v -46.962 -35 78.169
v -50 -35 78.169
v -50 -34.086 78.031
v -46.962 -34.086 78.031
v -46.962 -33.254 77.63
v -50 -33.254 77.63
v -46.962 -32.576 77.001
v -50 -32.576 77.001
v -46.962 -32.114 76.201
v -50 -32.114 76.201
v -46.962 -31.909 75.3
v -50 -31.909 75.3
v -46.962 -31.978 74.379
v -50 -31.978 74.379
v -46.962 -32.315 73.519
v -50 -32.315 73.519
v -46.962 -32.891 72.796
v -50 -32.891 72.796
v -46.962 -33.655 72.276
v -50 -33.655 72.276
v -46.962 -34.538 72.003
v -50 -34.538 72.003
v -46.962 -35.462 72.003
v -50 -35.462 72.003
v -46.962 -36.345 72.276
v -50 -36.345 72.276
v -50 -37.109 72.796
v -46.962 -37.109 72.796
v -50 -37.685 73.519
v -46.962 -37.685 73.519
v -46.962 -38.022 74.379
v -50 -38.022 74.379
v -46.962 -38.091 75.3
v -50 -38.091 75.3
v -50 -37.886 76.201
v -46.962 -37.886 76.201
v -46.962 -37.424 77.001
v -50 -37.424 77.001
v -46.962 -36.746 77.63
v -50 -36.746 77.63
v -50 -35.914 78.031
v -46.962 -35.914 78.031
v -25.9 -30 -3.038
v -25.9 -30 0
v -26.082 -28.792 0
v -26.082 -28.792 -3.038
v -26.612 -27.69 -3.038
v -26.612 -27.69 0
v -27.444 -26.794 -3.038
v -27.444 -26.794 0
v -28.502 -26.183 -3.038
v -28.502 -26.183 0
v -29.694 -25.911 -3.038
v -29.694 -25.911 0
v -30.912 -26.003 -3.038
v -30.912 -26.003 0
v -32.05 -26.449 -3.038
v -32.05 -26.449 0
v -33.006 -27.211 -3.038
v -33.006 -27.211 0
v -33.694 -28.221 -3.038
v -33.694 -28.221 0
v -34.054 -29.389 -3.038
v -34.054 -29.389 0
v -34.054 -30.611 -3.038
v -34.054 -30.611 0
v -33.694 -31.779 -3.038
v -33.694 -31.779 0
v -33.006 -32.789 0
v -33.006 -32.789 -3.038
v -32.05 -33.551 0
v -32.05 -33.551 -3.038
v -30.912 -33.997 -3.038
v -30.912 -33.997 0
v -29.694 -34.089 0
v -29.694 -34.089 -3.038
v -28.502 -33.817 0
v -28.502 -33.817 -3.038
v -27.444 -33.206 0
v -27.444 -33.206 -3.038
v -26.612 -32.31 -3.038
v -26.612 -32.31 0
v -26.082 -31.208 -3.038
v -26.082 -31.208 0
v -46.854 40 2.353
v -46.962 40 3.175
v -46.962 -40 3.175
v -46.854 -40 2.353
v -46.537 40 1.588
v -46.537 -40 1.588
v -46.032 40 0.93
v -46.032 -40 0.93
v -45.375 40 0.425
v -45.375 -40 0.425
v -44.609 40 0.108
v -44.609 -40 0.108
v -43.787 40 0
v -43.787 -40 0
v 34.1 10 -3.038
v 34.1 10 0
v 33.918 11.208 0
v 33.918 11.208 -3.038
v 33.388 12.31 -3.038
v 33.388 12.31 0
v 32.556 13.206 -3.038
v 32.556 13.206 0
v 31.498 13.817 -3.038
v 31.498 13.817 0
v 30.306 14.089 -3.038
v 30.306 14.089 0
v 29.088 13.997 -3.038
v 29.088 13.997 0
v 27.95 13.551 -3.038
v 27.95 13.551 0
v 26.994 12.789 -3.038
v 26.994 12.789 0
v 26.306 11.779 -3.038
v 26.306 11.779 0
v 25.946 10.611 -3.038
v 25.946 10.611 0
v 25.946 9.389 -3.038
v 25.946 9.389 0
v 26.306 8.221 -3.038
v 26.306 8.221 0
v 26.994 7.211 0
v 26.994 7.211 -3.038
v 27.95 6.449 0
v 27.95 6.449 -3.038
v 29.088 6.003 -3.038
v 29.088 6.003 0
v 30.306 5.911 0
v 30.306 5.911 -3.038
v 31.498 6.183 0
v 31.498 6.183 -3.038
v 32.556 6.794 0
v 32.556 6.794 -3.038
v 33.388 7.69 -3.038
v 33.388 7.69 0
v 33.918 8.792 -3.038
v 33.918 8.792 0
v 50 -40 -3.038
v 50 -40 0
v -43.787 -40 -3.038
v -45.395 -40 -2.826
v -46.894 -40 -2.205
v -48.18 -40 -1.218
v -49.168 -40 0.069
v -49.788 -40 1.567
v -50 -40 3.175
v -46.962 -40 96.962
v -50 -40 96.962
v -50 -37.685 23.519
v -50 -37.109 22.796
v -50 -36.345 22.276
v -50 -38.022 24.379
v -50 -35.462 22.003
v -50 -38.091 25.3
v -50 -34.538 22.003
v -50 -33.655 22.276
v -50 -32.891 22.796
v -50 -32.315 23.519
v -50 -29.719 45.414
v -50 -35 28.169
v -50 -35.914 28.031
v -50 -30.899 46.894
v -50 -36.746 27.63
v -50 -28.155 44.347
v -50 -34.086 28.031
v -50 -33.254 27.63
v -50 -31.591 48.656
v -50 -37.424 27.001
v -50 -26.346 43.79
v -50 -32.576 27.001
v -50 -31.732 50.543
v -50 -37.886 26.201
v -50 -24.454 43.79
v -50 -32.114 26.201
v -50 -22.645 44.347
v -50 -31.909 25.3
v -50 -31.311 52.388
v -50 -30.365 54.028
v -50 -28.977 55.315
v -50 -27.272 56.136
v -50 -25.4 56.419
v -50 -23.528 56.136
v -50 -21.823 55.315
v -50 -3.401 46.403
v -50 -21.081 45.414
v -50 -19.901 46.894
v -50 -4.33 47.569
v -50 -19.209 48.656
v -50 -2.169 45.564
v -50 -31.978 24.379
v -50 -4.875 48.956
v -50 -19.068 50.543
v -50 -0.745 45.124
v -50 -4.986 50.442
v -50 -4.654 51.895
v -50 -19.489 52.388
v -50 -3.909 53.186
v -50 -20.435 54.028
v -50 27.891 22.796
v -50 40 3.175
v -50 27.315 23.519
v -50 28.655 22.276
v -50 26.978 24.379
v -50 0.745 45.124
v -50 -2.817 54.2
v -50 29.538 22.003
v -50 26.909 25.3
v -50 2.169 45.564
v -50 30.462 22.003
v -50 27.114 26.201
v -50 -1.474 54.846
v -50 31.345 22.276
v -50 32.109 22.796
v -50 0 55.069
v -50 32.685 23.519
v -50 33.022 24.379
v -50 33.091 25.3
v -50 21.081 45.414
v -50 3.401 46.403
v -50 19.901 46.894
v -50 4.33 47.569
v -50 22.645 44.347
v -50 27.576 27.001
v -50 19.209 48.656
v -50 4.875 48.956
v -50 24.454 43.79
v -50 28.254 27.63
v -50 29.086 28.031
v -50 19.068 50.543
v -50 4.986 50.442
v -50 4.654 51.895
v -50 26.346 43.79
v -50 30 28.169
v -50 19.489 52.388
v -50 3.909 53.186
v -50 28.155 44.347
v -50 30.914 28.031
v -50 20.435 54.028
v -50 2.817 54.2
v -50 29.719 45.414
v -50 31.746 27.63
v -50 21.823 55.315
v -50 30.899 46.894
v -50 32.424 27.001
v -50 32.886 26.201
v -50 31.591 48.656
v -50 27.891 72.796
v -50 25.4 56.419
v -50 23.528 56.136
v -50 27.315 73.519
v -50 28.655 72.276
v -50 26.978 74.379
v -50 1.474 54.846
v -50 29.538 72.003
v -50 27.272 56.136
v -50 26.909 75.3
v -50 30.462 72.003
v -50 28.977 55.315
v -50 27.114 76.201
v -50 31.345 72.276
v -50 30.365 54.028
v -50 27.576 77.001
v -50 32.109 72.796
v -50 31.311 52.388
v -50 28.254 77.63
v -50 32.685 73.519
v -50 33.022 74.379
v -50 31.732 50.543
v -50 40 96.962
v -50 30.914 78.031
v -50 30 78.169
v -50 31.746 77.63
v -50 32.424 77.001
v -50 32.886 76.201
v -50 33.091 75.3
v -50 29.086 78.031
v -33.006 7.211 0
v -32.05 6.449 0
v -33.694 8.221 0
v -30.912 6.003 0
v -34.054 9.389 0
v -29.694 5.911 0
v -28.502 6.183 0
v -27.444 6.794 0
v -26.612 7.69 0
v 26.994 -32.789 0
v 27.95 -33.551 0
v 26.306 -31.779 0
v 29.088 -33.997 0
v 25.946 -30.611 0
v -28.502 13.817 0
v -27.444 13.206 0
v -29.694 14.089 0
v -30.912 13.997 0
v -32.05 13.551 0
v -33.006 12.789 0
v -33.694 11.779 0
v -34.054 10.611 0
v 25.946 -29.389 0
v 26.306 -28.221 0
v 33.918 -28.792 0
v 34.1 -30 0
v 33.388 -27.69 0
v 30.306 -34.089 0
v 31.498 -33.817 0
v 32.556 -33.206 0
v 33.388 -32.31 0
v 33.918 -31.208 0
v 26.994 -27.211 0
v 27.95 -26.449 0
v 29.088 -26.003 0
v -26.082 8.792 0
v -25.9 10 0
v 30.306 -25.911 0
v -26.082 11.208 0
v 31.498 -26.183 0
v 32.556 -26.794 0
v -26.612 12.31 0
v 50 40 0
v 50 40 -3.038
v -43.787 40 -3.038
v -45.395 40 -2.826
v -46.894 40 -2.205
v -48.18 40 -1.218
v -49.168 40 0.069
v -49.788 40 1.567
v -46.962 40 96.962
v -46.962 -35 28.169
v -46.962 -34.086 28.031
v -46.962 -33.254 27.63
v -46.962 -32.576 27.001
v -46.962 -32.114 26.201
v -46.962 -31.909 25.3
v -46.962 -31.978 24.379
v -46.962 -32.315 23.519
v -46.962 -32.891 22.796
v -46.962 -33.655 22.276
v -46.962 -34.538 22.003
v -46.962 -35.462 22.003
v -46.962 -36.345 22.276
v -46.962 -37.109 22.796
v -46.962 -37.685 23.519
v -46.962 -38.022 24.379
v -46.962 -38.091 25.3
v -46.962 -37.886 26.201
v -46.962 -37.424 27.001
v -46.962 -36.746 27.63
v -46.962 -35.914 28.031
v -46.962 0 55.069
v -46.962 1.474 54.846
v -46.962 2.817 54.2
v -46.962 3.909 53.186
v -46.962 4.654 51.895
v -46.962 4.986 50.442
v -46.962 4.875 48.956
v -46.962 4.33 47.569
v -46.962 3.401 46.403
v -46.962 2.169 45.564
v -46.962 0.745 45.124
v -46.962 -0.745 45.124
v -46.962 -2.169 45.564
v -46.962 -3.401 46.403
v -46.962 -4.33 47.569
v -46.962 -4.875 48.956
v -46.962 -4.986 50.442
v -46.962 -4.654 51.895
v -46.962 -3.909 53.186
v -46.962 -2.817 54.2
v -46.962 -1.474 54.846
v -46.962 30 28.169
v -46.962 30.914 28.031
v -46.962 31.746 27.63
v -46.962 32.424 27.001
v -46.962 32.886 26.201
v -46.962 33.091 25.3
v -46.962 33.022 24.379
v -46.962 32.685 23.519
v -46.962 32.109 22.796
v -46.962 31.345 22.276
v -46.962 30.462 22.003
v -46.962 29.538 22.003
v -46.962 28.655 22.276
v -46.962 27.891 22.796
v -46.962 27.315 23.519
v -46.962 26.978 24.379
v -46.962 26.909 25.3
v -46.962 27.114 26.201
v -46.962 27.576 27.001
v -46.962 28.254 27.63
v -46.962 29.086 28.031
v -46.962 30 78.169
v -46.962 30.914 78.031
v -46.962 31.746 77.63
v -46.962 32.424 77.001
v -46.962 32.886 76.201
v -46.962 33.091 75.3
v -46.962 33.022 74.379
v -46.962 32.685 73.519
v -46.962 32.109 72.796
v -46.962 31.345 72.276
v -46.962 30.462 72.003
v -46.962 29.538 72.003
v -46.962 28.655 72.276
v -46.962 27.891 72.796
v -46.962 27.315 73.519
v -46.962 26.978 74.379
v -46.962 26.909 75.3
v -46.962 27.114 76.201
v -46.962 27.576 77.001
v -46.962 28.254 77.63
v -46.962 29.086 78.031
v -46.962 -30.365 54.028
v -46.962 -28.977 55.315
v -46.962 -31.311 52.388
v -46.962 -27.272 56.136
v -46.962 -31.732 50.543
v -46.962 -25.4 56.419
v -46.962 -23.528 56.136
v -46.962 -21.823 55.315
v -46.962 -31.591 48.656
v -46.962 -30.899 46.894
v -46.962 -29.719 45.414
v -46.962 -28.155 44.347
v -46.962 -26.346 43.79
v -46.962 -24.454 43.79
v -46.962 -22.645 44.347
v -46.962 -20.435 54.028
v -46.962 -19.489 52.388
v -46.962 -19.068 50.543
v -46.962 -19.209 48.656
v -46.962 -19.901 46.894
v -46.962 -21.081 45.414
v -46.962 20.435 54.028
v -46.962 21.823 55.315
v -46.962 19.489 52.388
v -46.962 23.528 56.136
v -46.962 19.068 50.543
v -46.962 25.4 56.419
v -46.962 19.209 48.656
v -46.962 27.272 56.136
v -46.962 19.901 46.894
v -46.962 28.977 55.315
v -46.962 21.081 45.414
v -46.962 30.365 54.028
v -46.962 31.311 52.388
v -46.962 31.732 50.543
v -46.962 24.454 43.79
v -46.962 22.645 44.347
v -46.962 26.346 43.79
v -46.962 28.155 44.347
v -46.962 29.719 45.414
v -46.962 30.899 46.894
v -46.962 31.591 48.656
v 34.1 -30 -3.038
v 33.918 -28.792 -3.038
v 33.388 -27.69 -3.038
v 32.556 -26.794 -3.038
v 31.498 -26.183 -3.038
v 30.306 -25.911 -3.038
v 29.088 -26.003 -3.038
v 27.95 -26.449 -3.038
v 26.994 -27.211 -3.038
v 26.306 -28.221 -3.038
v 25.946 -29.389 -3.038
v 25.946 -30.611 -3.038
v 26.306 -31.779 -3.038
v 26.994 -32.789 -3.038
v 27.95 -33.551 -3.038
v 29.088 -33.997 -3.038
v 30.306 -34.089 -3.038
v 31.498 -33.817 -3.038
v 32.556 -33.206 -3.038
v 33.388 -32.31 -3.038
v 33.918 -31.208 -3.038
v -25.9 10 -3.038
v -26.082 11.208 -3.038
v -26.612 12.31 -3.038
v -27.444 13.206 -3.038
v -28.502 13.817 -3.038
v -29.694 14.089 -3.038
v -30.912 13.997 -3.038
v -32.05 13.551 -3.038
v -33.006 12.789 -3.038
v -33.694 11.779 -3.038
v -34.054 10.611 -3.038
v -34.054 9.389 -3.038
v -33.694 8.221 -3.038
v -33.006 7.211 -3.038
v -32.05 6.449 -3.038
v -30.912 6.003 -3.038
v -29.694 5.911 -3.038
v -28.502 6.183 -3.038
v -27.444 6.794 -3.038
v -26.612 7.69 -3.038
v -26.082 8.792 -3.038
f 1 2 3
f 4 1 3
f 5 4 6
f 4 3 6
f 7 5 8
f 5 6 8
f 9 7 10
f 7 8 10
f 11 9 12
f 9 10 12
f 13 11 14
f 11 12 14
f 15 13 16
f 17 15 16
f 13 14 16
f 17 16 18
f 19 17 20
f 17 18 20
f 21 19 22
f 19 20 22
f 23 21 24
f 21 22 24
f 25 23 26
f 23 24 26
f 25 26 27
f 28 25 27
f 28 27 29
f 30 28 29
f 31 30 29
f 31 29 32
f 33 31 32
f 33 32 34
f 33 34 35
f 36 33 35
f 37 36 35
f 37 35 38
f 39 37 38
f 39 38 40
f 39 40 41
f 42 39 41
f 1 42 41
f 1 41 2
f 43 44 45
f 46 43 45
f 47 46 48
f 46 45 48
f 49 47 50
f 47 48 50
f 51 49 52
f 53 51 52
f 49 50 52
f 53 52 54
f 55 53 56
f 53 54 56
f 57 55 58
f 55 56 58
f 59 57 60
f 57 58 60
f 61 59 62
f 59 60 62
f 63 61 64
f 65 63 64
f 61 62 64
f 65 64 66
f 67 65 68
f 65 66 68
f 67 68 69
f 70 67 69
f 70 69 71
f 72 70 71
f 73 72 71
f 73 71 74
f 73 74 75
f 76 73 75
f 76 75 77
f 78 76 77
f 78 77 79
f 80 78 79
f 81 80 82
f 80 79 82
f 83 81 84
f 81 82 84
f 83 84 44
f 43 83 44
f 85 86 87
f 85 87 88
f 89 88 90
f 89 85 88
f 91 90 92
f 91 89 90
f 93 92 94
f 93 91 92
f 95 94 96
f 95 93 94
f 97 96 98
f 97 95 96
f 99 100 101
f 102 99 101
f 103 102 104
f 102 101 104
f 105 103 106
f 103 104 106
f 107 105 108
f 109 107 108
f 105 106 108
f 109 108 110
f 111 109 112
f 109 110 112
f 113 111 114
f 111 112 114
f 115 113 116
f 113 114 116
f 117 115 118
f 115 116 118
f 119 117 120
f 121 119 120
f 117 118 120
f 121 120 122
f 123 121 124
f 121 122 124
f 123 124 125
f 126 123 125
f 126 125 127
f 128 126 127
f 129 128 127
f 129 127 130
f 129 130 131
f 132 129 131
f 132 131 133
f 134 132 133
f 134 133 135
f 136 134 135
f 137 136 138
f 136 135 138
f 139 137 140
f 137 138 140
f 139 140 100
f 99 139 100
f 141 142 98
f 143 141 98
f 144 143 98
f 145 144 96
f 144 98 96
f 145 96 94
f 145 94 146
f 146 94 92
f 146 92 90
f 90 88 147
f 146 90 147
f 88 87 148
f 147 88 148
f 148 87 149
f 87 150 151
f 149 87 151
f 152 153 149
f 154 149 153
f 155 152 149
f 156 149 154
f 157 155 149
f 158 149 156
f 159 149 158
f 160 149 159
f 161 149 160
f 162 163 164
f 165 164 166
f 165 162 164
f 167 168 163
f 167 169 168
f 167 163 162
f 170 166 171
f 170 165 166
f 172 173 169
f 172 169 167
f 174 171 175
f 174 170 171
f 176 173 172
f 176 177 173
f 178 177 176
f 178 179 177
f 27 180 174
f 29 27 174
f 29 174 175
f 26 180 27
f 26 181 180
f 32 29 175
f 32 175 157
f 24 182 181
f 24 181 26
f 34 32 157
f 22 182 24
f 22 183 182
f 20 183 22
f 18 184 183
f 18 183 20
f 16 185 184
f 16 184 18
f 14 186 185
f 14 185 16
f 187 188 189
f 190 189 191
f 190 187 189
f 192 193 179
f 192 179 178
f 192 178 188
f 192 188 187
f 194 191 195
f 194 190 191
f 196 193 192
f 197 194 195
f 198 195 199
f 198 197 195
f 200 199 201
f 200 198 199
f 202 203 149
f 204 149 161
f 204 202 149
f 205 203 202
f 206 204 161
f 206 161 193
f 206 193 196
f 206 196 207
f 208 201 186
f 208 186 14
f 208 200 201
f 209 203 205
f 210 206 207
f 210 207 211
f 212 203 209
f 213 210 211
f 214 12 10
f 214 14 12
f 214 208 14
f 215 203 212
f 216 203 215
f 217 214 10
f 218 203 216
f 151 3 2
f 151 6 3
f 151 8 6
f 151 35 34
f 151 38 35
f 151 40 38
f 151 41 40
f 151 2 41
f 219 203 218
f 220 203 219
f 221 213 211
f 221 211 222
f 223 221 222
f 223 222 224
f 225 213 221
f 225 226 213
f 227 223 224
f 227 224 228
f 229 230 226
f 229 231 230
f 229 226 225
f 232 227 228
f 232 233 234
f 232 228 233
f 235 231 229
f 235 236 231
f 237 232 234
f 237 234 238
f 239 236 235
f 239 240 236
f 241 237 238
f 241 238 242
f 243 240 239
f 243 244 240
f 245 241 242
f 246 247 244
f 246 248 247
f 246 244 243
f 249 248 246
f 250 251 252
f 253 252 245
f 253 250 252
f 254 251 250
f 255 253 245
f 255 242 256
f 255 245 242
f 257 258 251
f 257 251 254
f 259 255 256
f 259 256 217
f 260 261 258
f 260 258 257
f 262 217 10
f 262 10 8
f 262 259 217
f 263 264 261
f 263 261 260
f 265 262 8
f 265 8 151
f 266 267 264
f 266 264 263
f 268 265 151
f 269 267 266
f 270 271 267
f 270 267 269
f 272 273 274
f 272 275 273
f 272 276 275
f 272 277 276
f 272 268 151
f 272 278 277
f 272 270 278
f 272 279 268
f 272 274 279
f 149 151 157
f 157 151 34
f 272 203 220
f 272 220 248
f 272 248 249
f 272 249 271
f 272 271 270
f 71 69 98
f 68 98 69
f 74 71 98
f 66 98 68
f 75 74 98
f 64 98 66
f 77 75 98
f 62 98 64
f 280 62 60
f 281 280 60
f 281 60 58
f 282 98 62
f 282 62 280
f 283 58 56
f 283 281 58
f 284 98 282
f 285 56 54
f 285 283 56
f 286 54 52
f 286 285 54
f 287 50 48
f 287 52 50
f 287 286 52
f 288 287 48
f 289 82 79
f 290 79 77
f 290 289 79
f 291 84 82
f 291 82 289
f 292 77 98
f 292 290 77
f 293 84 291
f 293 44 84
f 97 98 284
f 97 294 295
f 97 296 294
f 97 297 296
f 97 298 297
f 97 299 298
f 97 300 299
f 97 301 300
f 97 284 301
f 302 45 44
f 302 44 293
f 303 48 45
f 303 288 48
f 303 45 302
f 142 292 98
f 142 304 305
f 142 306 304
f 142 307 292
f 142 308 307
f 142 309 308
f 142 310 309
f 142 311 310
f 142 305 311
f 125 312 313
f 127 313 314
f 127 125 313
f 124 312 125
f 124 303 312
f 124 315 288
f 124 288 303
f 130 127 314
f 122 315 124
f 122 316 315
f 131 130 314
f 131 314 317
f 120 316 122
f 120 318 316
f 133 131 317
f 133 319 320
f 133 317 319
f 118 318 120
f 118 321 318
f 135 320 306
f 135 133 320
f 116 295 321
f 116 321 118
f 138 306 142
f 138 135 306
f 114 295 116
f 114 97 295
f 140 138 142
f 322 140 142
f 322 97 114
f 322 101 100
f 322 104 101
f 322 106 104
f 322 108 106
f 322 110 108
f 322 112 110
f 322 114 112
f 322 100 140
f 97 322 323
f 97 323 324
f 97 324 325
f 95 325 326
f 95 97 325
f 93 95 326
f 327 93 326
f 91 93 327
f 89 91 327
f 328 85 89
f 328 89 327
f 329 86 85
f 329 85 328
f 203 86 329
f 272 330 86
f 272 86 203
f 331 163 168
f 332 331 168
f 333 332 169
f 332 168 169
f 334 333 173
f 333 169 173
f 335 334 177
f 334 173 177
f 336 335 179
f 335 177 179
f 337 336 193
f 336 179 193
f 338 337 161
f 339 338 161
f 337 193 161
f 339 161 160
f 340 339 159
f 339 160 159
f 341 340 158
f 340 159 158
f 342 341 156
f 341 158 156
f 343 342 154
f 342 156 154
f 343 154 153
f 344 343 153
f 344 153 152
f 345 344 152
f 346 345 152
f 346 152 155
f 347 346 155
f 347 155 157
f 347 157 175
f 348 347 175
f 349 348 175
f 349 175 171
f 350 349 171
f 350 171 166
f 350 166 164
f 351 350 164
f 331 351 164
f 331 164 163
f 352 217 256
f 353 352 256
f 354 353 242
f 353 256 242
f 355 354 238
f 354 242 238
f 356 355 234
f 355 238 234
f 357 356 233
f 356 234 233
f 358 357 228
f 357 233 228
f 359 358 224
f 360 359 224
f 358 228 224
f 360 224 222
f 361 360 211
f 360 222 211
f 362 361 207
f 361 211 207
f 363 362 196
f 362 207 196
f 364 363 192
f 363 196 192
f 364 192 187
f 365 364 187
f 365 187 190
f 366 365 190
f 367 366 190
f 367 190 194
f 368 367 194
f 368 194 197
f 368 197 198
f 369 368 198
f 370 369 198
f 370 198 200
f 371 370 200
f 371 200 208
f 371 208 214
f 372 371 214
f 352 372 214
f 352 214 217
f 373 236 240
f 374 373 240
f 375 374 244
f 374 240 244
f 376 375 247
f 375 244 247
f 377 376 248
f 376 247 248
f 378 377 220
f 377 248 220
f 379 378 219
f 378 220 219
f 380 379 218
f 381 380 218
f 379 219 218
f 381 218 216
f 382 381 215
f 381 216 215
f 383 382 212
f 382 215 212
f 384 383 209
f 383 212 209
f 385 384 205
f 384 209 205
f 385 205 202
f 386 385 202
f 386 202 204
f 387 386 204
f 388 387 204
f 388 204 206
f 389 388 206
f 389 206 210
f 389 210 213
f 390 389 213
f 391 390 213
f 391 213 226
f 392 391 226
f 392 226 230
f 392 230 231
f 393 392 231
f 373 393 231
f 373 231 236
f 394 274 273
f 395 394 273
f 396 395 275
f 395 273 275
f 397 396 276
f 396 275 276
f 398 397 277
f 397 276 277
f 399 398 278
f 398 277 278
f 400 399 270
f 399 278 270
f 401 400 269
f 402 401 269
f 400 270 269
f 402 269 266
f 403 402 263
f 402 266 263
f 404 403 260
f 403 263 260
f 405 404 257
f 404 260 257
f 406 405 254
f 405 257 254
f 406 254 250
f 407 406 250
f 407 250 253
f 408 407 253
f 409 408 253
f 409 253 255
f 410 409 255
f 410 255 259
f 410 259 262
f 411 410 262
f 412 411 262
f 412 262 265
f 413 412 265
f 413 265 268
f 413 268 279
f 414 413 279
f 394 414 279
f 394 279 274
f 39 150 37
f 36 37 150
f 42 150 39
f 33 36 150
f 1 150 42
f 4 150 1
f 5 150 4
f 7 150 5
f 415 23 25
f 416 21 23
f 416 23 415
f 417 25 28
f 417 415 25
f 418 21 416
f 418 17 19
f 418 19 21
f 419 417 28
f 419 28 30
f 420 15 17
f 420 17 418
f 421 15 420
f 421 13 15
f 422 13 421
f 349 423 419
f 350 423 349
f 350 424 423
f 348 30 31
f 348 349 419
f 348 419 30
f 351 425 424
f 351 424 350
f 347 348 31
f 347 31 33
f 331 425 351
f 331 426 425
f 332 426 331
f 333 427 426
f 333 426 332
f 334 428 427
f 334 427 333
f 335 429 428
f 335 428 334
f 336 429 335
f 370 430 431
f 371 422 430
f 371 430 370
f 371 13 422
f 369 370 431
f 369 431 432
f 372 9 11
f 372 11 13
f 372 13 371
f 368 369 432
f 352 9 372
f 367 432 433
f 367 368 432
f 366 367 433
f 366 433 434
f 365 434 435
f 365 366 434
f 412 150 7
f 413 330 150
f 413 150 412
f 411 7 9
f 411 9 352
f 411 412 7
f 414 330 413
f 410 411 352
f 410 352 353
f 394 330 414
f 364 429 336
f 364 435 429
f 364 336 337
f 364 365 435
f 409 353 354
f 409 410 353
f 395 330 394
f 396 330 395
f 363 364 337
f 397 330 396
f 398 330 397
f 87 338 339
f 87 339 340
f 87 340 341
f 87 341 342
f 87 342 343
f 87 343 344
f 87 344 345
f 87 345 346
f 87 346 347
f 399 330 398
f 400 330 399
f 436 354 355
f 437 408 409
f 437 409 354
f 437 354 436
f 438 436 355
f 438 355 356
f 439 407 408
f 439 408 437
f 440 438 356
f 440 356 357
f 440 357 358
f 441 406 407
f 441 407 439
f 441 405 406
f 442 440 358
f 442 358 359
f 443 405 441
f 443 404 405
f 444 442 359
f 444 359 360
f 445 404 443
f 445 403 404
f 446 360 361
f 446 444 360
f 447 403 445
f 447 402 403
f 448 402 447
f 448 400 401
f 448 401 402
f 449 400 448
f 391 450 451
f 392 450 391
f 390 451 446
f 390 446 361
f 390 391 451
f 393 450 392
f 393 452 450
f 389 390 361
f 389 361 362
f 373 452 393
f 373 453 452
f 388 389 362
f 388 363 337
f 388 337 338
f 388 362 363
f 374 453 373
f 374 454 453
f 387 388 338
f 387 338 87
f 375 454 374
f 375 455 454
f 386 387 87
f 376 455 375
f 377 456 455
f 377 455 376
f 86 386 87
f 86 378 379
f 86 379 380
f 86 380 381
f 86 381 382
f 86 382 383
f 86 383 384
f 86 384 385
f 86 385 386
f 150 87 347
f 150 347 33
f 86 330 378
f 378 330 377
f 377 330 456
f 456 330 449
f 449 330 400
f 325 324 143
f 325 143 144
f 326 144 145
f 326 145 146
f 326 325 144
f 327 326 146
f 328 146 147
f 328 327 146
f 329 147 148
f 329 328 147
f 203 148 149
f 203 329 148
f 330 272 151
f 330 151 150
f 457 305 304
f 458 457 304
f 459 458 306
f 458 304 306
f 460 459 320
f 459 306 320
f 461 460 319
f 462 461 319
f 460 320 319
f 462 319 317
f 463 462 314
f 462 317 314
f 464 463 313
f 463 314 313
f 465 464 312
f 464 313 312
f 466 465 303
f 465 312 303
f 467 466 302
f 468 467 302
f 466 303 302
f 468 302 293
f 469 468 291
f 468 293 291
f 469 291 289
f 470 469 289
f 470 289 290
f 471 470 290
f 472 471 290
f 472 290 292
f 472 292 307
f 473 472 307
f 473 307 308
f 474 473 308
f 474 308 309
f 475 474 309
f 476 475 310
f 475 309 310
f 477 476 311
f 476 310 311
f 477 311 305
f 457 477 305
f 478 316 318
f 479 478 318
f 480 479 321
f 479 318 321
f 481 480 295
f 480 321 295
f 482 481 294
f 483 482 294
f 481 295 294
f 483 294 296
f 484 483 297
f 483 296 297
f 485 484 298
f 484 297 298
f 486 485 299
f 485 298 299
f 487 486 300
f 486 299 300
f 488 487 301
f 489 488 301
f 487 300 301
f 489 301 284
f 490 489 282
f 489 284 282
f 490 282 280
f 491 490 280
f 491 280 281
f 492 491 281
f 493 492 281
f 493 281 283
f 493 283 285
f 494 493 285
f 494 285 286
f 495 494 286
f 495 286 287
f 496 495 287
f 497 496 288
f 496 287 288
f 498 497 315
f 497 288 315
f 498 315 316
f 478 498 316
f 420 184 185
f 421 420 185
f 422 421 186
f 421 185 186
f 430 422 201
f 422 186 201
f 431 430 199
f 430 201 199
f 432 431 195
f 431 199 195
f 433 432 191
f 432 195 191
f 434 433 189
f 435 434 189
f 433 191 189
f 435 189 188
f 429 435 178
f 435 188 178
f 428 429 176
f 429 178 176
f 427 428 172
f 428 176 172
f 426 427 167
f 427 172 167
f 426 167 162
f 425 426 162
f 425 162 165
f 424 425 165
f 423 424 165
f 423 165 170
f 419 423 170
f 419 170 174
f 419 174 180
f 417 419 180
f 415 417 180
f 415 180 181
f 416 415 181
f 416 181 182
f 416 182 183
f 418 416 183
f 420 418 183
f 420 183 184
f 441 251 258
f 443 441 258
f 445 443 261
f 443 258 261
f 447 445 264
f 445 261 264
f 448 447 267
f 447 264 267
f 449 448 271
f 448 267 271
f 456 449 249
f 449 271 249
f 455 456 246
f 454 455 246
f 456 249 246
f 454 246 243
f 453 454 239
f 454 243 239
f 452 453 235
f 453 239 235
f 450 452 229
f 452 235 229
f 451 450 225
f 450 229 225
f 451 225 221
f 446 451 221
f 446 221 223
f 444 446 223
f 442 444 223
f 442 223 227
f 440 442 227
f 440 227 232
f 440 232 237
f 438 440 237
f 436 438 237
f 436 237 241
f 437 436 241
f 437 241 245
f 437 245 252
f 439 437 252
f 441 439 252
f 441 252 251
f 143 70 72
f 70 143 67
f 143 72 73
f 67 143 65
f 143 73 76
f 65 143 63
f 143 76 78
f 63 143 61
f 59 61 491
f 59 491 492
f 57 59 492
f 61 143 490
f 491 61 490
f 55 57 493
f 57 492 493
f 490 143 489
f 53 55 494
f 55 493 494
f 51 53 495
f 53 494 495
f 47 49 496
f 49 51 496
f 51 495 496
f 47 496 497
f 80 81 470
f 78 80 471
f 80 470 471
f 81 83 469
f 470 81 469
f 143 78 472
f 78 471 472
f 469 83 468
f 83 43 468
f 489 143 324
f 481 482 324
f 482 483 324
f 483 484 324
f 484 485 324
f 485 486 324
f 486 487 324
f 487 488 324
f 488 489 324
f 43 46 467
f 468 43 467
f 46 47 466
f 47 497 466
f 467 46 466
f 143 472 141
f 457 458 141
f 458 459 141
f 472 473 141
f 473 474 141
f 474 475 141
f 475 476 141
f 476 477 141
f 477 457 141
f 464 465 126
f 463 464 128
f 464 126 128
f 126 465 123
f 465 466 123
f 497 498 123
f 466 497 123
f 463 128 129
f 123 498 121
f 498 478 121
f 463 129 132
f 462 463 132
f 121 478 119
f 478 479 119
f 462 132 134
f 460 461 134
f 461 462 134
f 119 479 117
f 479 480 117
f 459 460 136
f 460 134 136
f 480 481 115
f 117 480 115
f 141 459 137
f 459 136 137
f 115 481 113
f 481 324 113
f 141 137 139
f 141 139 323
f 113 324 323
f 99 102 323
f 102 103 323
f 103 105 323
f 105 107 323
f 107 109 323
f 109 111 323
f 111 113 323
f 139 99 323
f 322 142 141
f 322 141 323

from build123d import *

# Parameters (mm, degrees)
CROQUIS1_W                       = 100
CROQUIS1_H                       = 80
CROQUIS1_R                       = 4.1
BRIDA_BASE1_DEPTH                = 3.03784
BRIDA_DE_ARISTA1_STRIP_W         = 18.50136
BRIDA_DE_ARISTA1_STRIP_H         = 3.03784
BRIDA_DE_ARISTA1_STRIP_CUT_DEPTH = 80
BRIDA_DE_ARISTA1_DEPTH           = 80
CORTAR_EXTRUIR1_REACH            = 146.919
CROQUIS9_R                       = 6.35
CROQUIS9_R_2                     = 3.1
CROQUIS9_R_3                     = 5


# Sheet-metal steps are written as plain solids
with BuildPart() as part:
    # Croquis1 → Brida base1 (new body)
    with BuildSketch(Plane.XY):
        Rectangle(CROQUIS1_W, CROQUIS1_H)
        with Locations((-30, 10)):
            Circle(CROQUIS1_R, mode=Mode.SUBTRACT)
        with Locations((30, 10)):
            Circle(CROQUIS1_R, mode=Mode.SUBTRACT)
        with Locations((-30, -30)):
            Circle(CROQUIS1_R, mode=Mode.SUBTRACT)
        with Locations((30, -30)):
            Circle(CROQUIS1_R, mode=Mode.SUBTRACT)
    extrude(amount=-BRIDA_BASE1_DEPTH)

    # Brida de arista1 strip (across the edge) → Brida de arista1 strip cut (cut)
    with BuildSketch(Plane(origin=(-50, 40, 0), x_dir=(1, 0, 0), z_dir=(0, -1, 0))):
        with Locations((-3.03784, -1.51892)):
            Rectangle(BRIDA_DE_ARISTA1_STRIP_W, BRIDA_DE_ARISTA1_STRIP_H)
    extrude(amount=BRIDA_DE_ARISTA1_STRIP_CUT_DEPTH, mode=Mode.SUBTRACT)

    # Brida de arista1 section (across the edge) → Brida de arista1 (add)
    with BuildSketch(Plane(origin=(-50, 40, 0), x_dir=(1, 0, 0), z_dir=(0, -1, 0))):
        with BuildLine():
            Line((0, 3.175), (0, 96.96216))
            Line((0, 96.96216), (3.03784, 96.96216))
            Line((3.03784, 96.96216), (3.03784, 3.175))
            ThreePointArc((3.03784, 3.175), (3.96777597, 0.92993597), (6.21284, 0))
            Line((6.21284, 0), (6.21284, -3.03784))
            ThreePointArc((6.21284, -3.03784), (1.819698706, -1.218141294), (0, 3.175))
        make_face()
    extrude(amount=BRIDA_DE_ARISTA1_DEPTH)

    # Croquis9 → Cortar-Extruir1 (cut, up to next)
    with BuildSketch(Plane.ZY.offset(50), mode=Mode.PRIVATE) as cortar_extruir1_sk1:
        with Locations((50.06858, 25.4)):
            Circle(CROQUIS9_R)
    cortar_extruir1_tool1 = extrude(cortar_extruir1_sk1.sketch, amount=-CORTAR_EXTRUIR1_REACH, mode=Mode.PRIVATE) & part.part
    # Croquis9 → Cortar-Extruir1 (cut, up to next)
    with BuildSketch(Plane.ZY.offset(50), mode=Mode.PRIVATE) as cortar_extruir1_sk2:
        with Locations((50.06858, -25.4)):
            Circle(CROQUIS9_R)
    cortar_extruir1_tool2 = extrude(cortar_extruir1_sk2.sketch, amount=-CORTAR_EXTRUIR1_REACH, mode=Mode.PRIVATE) & part.part
    # Croquis9 → Cortar-Extruir1 (cut, up to next)
    with BuildSketch(Plane.ZY.offset(50), mode=Mode.PRIVATE) as cortar_extruir1_sk3:
        with Locations((25.06858, 30)):
            Circle(CROQUIS9_R_2)
    cortar_extruir1_tool3 = extrude(cortar_extruir1_sk3.sketch, amount=-CORTAR_EXTRUIR1_REACH, mode=Mode.PRIVATE) & part.part
    # Croquis9 → Cortar-Extruir1 (cut, up to next)
    with BuildSketch(Plane.ZY.offset(50), mode=Mode.PRIVATE) as cortar_extruir1_sk4:
        with Locations((75.06858, 30)):
            Circle(CROQUIS9_R_2)
    cortar_extruir1_tool4 = extrude(cortar_extruir1_sk4.sketch, amount=-CORTAR_EXTRUIR1_REACH, mode=Mode.PRIVATE) & part.part
    # Croquis9 → Cortar-Extruir1 (cut, up to next)
    with BuildSketch(Plane.ZY.offset(50), mode=Mode.PRIVATE) as cortar_extruir1_sk5:
        with Locations((25.06858, -35)):
            Circle(CROQUIS9_R_2)
    cortar_extruir1_tool5 = extrude(cortar_extruir1_sk5.sketch, amount=-CORTAR_EXTRUIR1_REACH, mode=Mode.PRIVATE) & part.part
    # Croquis9 → Cortar-Extruir1 (cut, up to next)
    with BuildSketch(Plane.ZY.offset(50), mode=Mode.PRIVATE) as cortar_extruir1_sk6:
        with Locations((75.06858, -35)):
            Circle(CROQUIS9_R_2)
    cortar_extruir1_tool6 = extrude(cortar_extruir1_sk6.sketch, amount=-CORTAR_EXTRUIR1_REACH, mode=Mode.PRIVATE) & part.part
    # Croquis9 → Cortar-Extruir1 (cut, up to next)
    with BuildSketch(Plane.ZY.offset(50), mode=Mode.PRIVATE) as cortar_extruir1_sk7:
        with Locations((50.06858, 0)):
            Circle(CROQUIS9_R_3)
    cortar_extruir1_tool7 = extrude(cortar_extruir1_sk7.sketch, amount=-CORTAR_EXTRUIR1_REACH, mode=Mode.PRIVATE) & part.part
    add(cortar_extruir1_tool1.solids().sort_by_distance((-50, 25.4, 50.06858))[0], mode=Mode.SUBTRACT)
    add(cortar_extruir1_tool2.solids().sort_by_distance((-50, -25.4, 50.06858))[0], mode=Mode.SUBTRACT)
    add(cortar_extruir1_tool3.solids().sort_by_distance((-50, 30, 25.06858))[0], mode=Mode.SUBTRACT)
    add(cortar_extruir1_tool4.solids().sort_by_distance((-50, 30, 75.06858))[0], mode=Mode.SUBTRACT)
    add(cortar_extruir1_tool5.solids().sort_by_distance((-50, -35, 25.06858))[0], mode=Mode.SUBTRACT)
    add(cortar_extruir1_tool6.solids().sort_by_distance((-50, -35, 75.06858))[0], mode=Mode.SUBTRACT)
    add(cortar_extruir1_tool7.solids().sort_by_distance((-50, 0, 50.06858))[0], mode=Mode.SUBTRACT)


solid = part.part
